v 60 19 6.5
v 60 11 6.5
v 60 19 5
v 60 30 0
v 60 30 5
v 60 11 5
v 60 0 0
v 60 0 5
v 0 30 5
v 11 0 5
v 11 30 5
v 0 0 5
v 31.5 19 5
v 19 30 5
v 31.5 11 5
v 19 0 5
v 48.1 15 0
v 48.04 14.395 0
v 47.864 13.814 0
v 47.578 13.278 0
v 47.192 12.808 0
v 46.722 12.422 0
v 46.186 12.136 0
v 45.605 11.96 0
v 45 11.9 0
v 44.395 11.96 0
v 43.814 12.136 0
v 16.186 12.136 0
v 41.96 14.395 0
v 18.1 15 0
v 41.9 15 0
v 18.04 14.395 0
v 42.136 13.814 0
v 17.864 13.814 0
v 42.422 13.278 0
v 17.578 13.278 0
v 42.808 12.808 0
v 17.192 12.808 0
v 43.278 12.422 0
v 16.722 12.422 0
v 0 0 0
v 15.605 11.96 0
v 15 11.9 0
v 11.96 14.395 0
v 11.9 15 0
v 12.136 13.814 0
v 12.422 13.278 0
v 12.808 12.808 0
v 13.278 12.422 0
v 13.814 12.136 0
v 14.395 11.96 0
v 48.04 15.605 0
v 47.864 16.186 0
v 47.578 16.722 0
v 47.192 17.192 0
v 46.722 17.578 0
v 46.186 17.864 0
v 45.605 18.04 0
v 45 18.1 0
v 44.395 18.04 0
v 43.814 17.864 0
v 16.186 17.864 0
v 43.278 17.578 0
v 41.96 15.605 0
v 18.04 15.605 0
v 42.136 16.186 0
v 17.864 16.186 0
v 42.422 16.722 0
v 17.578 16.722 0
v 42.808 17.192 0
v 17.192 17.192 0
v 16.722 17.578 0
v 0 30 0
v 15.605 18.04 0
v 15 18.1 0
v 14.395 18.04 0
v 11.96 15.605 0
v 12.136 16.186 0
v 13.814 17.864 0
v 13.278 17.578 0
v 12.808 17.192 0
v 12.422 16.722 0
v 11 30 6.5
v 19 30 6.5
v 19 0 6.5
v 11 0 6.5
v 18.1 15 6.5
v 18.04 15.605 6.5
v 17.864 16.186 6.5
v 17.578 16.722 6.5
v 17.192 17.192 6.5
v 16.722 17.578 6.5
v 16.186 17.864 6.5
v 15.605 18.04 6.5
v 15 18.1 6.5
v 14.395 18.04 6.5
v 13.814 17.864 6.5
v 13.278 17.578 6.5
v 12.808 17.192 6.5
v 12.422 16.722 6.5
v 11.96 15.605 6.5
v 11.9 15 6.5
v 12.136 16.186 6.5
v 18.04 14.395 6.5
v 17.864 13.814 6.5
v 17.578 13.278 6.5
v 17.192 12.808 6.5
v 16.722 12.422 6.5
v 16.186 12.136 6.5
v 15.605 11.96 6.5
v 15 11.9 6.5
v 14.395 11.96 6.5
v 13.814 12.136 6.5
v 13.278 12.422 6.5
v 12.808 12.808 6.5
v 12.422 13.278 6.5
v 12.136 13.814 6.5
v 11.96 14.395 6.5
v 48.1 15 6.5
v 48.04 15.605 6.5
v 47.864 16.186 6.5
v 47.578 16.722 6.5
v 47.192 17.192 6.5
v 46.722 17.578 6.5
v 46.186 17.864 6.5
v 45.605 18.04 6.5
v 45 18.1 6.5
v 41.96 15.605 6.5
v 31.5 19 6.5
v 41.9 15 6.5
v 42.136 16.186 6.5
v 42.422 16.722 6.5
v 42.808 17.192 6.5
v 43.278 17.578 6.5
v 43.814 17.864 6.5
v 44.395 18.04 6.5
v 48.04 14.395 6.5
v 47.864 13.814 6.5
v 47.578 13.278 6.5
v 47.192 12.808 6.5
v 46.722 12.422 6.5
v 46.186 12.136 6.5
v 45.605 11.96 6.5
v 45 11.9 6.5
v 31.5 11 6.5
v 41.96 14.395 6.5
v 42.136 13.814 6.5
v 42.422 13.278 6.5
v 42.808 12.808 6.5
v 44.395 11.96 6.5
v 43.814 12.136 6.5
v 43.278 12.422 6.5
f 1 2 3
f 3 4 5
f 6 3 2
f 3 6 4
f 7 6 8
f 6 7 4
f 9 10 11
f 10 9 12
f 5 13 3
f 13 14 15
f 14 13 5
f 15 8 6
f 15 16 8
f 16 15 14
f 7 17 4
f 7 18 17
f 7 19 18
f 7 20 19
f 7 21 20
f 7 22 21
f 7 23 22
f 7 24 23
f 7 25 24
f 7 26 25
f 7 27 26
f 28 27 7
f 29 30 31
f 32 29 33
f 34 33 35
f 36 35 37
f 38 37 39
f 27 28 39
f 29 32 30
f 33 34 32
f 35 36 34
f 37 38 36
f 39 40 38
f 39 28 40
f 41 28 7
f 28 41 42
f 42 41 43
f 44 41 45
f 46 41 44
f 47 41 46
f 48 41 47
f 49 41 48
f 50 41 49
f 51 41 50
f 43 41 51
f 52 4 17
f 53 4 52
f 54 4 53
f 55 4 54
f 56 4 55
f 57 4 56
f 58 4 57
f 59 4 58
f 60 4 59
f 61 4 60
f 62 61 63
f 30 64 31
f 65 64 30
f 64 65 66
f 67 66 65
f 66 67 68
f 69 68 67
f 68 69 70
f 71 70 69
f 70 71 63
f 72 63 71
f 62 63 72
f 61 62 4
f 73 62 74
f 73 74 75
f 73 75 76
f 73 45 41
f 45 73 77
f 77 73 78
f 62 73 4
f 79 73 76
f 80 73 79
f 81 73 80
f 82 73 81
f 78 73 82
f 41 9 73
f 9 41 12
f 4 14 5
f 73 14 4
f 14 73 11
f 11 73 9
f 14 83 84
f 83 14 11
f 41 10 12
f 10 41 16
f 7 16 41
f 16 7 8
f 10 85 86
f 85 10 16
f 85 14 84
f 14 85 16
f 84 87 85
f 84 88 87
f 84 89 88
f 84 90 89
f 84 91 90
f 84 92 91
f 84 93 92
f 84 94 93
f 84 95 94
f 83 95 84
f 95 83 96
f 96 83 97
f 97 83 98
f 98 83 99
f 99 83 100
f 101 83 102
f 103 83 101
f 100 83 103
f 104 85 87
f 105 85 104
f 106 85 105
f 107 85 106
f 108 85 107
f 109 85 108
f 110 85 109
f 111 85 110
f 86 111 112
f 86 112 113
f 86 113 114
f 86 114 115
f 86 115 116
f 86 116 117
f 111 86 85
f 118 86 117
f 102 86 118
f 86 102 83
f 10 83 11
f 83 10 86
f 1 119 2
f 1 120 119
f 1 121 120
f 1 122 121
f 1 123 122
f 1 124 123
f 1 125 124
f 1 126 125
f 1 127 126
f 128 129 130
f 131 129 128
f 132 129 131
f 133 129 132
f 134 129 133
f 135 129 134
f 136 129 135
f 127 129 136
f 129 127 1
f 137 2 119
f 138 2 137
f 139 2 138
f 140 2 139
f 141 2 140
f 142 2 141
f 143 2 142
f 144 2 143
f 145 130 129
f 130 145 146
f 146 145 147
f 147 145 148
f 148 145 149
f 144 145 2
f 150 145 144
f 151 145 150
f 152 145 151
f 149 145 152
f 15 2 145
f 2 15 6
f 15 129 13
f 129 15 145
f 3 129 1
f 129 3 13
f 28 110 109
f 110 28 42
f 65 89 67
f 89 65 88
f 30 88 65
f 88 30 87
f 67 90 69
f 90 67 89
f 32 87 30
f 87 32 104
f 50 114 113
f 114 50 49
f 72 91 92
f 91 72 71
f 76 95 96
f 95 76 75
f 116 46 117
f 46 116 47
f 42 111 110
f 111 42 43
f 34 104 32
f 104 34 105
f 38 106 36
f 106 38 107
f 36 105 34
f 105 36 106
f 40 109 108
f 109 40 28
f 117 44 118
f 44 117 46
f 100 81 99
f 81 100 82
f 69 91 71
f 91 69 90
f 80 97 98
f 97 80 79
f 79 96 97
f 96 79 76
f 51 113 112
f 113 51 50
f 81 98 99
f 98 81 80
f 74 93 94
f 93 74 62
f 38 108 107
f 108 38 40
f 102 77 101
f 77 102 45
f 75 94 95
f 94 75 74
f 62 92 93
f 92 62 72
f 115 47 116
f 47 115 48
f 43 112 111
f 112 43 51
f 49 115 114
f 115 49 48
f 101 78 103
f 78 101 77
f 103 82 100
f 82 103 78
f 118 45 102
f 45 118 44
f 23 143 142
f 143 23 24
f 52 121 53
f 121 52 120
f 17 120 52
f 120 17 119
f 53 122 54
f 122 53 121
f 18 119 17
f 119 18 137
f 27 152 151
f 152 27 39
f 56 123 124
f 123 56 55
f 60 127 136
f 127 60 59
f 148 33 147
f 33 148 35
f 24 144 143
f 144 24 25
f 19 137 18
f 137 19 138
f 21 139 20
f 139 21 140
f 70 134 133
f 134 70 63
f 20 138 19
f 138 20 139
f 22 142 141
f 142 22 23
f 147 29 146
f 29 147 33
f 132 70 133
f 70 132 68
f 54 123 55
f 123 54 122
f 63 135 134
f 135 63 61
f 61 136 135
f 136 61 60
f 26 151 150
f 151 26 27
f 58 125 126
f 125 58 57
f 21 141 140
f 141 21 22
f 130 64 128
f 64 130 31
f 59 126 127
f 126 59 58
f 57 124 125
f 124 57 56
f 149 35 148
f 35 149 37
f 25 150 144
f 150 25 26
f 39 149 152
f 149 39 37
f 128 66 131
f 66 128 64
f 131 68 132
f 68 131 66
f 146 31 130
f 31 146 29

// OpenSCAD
// RebeliX
//
// corner coupler
// GNU GPL v3
// Martin Neruda <neruda@reprap4u.cz>
// http://www.reprap4u.cz
// Inspired by Rebel II

// Postacuji i 4 mm
base_thickness = 5;

difference(){
	union(){
		cube([60,30,base_thickness], center = false);
		translate([11,0,0])cube([8,30,base_thickness+1.5]);
		translate([60,30/2-4,0])rotate(90,0,0)cube([8,28.5,base_thickness+1.5]);
		}
		
		translate([11+4,30/2,-0.1])cylinder(h=10,r=3.1,$fn=32);
		translate([60-30/2,30/2,-0.1])cylinder(h=10,r=3.1,$fn=32);
}
